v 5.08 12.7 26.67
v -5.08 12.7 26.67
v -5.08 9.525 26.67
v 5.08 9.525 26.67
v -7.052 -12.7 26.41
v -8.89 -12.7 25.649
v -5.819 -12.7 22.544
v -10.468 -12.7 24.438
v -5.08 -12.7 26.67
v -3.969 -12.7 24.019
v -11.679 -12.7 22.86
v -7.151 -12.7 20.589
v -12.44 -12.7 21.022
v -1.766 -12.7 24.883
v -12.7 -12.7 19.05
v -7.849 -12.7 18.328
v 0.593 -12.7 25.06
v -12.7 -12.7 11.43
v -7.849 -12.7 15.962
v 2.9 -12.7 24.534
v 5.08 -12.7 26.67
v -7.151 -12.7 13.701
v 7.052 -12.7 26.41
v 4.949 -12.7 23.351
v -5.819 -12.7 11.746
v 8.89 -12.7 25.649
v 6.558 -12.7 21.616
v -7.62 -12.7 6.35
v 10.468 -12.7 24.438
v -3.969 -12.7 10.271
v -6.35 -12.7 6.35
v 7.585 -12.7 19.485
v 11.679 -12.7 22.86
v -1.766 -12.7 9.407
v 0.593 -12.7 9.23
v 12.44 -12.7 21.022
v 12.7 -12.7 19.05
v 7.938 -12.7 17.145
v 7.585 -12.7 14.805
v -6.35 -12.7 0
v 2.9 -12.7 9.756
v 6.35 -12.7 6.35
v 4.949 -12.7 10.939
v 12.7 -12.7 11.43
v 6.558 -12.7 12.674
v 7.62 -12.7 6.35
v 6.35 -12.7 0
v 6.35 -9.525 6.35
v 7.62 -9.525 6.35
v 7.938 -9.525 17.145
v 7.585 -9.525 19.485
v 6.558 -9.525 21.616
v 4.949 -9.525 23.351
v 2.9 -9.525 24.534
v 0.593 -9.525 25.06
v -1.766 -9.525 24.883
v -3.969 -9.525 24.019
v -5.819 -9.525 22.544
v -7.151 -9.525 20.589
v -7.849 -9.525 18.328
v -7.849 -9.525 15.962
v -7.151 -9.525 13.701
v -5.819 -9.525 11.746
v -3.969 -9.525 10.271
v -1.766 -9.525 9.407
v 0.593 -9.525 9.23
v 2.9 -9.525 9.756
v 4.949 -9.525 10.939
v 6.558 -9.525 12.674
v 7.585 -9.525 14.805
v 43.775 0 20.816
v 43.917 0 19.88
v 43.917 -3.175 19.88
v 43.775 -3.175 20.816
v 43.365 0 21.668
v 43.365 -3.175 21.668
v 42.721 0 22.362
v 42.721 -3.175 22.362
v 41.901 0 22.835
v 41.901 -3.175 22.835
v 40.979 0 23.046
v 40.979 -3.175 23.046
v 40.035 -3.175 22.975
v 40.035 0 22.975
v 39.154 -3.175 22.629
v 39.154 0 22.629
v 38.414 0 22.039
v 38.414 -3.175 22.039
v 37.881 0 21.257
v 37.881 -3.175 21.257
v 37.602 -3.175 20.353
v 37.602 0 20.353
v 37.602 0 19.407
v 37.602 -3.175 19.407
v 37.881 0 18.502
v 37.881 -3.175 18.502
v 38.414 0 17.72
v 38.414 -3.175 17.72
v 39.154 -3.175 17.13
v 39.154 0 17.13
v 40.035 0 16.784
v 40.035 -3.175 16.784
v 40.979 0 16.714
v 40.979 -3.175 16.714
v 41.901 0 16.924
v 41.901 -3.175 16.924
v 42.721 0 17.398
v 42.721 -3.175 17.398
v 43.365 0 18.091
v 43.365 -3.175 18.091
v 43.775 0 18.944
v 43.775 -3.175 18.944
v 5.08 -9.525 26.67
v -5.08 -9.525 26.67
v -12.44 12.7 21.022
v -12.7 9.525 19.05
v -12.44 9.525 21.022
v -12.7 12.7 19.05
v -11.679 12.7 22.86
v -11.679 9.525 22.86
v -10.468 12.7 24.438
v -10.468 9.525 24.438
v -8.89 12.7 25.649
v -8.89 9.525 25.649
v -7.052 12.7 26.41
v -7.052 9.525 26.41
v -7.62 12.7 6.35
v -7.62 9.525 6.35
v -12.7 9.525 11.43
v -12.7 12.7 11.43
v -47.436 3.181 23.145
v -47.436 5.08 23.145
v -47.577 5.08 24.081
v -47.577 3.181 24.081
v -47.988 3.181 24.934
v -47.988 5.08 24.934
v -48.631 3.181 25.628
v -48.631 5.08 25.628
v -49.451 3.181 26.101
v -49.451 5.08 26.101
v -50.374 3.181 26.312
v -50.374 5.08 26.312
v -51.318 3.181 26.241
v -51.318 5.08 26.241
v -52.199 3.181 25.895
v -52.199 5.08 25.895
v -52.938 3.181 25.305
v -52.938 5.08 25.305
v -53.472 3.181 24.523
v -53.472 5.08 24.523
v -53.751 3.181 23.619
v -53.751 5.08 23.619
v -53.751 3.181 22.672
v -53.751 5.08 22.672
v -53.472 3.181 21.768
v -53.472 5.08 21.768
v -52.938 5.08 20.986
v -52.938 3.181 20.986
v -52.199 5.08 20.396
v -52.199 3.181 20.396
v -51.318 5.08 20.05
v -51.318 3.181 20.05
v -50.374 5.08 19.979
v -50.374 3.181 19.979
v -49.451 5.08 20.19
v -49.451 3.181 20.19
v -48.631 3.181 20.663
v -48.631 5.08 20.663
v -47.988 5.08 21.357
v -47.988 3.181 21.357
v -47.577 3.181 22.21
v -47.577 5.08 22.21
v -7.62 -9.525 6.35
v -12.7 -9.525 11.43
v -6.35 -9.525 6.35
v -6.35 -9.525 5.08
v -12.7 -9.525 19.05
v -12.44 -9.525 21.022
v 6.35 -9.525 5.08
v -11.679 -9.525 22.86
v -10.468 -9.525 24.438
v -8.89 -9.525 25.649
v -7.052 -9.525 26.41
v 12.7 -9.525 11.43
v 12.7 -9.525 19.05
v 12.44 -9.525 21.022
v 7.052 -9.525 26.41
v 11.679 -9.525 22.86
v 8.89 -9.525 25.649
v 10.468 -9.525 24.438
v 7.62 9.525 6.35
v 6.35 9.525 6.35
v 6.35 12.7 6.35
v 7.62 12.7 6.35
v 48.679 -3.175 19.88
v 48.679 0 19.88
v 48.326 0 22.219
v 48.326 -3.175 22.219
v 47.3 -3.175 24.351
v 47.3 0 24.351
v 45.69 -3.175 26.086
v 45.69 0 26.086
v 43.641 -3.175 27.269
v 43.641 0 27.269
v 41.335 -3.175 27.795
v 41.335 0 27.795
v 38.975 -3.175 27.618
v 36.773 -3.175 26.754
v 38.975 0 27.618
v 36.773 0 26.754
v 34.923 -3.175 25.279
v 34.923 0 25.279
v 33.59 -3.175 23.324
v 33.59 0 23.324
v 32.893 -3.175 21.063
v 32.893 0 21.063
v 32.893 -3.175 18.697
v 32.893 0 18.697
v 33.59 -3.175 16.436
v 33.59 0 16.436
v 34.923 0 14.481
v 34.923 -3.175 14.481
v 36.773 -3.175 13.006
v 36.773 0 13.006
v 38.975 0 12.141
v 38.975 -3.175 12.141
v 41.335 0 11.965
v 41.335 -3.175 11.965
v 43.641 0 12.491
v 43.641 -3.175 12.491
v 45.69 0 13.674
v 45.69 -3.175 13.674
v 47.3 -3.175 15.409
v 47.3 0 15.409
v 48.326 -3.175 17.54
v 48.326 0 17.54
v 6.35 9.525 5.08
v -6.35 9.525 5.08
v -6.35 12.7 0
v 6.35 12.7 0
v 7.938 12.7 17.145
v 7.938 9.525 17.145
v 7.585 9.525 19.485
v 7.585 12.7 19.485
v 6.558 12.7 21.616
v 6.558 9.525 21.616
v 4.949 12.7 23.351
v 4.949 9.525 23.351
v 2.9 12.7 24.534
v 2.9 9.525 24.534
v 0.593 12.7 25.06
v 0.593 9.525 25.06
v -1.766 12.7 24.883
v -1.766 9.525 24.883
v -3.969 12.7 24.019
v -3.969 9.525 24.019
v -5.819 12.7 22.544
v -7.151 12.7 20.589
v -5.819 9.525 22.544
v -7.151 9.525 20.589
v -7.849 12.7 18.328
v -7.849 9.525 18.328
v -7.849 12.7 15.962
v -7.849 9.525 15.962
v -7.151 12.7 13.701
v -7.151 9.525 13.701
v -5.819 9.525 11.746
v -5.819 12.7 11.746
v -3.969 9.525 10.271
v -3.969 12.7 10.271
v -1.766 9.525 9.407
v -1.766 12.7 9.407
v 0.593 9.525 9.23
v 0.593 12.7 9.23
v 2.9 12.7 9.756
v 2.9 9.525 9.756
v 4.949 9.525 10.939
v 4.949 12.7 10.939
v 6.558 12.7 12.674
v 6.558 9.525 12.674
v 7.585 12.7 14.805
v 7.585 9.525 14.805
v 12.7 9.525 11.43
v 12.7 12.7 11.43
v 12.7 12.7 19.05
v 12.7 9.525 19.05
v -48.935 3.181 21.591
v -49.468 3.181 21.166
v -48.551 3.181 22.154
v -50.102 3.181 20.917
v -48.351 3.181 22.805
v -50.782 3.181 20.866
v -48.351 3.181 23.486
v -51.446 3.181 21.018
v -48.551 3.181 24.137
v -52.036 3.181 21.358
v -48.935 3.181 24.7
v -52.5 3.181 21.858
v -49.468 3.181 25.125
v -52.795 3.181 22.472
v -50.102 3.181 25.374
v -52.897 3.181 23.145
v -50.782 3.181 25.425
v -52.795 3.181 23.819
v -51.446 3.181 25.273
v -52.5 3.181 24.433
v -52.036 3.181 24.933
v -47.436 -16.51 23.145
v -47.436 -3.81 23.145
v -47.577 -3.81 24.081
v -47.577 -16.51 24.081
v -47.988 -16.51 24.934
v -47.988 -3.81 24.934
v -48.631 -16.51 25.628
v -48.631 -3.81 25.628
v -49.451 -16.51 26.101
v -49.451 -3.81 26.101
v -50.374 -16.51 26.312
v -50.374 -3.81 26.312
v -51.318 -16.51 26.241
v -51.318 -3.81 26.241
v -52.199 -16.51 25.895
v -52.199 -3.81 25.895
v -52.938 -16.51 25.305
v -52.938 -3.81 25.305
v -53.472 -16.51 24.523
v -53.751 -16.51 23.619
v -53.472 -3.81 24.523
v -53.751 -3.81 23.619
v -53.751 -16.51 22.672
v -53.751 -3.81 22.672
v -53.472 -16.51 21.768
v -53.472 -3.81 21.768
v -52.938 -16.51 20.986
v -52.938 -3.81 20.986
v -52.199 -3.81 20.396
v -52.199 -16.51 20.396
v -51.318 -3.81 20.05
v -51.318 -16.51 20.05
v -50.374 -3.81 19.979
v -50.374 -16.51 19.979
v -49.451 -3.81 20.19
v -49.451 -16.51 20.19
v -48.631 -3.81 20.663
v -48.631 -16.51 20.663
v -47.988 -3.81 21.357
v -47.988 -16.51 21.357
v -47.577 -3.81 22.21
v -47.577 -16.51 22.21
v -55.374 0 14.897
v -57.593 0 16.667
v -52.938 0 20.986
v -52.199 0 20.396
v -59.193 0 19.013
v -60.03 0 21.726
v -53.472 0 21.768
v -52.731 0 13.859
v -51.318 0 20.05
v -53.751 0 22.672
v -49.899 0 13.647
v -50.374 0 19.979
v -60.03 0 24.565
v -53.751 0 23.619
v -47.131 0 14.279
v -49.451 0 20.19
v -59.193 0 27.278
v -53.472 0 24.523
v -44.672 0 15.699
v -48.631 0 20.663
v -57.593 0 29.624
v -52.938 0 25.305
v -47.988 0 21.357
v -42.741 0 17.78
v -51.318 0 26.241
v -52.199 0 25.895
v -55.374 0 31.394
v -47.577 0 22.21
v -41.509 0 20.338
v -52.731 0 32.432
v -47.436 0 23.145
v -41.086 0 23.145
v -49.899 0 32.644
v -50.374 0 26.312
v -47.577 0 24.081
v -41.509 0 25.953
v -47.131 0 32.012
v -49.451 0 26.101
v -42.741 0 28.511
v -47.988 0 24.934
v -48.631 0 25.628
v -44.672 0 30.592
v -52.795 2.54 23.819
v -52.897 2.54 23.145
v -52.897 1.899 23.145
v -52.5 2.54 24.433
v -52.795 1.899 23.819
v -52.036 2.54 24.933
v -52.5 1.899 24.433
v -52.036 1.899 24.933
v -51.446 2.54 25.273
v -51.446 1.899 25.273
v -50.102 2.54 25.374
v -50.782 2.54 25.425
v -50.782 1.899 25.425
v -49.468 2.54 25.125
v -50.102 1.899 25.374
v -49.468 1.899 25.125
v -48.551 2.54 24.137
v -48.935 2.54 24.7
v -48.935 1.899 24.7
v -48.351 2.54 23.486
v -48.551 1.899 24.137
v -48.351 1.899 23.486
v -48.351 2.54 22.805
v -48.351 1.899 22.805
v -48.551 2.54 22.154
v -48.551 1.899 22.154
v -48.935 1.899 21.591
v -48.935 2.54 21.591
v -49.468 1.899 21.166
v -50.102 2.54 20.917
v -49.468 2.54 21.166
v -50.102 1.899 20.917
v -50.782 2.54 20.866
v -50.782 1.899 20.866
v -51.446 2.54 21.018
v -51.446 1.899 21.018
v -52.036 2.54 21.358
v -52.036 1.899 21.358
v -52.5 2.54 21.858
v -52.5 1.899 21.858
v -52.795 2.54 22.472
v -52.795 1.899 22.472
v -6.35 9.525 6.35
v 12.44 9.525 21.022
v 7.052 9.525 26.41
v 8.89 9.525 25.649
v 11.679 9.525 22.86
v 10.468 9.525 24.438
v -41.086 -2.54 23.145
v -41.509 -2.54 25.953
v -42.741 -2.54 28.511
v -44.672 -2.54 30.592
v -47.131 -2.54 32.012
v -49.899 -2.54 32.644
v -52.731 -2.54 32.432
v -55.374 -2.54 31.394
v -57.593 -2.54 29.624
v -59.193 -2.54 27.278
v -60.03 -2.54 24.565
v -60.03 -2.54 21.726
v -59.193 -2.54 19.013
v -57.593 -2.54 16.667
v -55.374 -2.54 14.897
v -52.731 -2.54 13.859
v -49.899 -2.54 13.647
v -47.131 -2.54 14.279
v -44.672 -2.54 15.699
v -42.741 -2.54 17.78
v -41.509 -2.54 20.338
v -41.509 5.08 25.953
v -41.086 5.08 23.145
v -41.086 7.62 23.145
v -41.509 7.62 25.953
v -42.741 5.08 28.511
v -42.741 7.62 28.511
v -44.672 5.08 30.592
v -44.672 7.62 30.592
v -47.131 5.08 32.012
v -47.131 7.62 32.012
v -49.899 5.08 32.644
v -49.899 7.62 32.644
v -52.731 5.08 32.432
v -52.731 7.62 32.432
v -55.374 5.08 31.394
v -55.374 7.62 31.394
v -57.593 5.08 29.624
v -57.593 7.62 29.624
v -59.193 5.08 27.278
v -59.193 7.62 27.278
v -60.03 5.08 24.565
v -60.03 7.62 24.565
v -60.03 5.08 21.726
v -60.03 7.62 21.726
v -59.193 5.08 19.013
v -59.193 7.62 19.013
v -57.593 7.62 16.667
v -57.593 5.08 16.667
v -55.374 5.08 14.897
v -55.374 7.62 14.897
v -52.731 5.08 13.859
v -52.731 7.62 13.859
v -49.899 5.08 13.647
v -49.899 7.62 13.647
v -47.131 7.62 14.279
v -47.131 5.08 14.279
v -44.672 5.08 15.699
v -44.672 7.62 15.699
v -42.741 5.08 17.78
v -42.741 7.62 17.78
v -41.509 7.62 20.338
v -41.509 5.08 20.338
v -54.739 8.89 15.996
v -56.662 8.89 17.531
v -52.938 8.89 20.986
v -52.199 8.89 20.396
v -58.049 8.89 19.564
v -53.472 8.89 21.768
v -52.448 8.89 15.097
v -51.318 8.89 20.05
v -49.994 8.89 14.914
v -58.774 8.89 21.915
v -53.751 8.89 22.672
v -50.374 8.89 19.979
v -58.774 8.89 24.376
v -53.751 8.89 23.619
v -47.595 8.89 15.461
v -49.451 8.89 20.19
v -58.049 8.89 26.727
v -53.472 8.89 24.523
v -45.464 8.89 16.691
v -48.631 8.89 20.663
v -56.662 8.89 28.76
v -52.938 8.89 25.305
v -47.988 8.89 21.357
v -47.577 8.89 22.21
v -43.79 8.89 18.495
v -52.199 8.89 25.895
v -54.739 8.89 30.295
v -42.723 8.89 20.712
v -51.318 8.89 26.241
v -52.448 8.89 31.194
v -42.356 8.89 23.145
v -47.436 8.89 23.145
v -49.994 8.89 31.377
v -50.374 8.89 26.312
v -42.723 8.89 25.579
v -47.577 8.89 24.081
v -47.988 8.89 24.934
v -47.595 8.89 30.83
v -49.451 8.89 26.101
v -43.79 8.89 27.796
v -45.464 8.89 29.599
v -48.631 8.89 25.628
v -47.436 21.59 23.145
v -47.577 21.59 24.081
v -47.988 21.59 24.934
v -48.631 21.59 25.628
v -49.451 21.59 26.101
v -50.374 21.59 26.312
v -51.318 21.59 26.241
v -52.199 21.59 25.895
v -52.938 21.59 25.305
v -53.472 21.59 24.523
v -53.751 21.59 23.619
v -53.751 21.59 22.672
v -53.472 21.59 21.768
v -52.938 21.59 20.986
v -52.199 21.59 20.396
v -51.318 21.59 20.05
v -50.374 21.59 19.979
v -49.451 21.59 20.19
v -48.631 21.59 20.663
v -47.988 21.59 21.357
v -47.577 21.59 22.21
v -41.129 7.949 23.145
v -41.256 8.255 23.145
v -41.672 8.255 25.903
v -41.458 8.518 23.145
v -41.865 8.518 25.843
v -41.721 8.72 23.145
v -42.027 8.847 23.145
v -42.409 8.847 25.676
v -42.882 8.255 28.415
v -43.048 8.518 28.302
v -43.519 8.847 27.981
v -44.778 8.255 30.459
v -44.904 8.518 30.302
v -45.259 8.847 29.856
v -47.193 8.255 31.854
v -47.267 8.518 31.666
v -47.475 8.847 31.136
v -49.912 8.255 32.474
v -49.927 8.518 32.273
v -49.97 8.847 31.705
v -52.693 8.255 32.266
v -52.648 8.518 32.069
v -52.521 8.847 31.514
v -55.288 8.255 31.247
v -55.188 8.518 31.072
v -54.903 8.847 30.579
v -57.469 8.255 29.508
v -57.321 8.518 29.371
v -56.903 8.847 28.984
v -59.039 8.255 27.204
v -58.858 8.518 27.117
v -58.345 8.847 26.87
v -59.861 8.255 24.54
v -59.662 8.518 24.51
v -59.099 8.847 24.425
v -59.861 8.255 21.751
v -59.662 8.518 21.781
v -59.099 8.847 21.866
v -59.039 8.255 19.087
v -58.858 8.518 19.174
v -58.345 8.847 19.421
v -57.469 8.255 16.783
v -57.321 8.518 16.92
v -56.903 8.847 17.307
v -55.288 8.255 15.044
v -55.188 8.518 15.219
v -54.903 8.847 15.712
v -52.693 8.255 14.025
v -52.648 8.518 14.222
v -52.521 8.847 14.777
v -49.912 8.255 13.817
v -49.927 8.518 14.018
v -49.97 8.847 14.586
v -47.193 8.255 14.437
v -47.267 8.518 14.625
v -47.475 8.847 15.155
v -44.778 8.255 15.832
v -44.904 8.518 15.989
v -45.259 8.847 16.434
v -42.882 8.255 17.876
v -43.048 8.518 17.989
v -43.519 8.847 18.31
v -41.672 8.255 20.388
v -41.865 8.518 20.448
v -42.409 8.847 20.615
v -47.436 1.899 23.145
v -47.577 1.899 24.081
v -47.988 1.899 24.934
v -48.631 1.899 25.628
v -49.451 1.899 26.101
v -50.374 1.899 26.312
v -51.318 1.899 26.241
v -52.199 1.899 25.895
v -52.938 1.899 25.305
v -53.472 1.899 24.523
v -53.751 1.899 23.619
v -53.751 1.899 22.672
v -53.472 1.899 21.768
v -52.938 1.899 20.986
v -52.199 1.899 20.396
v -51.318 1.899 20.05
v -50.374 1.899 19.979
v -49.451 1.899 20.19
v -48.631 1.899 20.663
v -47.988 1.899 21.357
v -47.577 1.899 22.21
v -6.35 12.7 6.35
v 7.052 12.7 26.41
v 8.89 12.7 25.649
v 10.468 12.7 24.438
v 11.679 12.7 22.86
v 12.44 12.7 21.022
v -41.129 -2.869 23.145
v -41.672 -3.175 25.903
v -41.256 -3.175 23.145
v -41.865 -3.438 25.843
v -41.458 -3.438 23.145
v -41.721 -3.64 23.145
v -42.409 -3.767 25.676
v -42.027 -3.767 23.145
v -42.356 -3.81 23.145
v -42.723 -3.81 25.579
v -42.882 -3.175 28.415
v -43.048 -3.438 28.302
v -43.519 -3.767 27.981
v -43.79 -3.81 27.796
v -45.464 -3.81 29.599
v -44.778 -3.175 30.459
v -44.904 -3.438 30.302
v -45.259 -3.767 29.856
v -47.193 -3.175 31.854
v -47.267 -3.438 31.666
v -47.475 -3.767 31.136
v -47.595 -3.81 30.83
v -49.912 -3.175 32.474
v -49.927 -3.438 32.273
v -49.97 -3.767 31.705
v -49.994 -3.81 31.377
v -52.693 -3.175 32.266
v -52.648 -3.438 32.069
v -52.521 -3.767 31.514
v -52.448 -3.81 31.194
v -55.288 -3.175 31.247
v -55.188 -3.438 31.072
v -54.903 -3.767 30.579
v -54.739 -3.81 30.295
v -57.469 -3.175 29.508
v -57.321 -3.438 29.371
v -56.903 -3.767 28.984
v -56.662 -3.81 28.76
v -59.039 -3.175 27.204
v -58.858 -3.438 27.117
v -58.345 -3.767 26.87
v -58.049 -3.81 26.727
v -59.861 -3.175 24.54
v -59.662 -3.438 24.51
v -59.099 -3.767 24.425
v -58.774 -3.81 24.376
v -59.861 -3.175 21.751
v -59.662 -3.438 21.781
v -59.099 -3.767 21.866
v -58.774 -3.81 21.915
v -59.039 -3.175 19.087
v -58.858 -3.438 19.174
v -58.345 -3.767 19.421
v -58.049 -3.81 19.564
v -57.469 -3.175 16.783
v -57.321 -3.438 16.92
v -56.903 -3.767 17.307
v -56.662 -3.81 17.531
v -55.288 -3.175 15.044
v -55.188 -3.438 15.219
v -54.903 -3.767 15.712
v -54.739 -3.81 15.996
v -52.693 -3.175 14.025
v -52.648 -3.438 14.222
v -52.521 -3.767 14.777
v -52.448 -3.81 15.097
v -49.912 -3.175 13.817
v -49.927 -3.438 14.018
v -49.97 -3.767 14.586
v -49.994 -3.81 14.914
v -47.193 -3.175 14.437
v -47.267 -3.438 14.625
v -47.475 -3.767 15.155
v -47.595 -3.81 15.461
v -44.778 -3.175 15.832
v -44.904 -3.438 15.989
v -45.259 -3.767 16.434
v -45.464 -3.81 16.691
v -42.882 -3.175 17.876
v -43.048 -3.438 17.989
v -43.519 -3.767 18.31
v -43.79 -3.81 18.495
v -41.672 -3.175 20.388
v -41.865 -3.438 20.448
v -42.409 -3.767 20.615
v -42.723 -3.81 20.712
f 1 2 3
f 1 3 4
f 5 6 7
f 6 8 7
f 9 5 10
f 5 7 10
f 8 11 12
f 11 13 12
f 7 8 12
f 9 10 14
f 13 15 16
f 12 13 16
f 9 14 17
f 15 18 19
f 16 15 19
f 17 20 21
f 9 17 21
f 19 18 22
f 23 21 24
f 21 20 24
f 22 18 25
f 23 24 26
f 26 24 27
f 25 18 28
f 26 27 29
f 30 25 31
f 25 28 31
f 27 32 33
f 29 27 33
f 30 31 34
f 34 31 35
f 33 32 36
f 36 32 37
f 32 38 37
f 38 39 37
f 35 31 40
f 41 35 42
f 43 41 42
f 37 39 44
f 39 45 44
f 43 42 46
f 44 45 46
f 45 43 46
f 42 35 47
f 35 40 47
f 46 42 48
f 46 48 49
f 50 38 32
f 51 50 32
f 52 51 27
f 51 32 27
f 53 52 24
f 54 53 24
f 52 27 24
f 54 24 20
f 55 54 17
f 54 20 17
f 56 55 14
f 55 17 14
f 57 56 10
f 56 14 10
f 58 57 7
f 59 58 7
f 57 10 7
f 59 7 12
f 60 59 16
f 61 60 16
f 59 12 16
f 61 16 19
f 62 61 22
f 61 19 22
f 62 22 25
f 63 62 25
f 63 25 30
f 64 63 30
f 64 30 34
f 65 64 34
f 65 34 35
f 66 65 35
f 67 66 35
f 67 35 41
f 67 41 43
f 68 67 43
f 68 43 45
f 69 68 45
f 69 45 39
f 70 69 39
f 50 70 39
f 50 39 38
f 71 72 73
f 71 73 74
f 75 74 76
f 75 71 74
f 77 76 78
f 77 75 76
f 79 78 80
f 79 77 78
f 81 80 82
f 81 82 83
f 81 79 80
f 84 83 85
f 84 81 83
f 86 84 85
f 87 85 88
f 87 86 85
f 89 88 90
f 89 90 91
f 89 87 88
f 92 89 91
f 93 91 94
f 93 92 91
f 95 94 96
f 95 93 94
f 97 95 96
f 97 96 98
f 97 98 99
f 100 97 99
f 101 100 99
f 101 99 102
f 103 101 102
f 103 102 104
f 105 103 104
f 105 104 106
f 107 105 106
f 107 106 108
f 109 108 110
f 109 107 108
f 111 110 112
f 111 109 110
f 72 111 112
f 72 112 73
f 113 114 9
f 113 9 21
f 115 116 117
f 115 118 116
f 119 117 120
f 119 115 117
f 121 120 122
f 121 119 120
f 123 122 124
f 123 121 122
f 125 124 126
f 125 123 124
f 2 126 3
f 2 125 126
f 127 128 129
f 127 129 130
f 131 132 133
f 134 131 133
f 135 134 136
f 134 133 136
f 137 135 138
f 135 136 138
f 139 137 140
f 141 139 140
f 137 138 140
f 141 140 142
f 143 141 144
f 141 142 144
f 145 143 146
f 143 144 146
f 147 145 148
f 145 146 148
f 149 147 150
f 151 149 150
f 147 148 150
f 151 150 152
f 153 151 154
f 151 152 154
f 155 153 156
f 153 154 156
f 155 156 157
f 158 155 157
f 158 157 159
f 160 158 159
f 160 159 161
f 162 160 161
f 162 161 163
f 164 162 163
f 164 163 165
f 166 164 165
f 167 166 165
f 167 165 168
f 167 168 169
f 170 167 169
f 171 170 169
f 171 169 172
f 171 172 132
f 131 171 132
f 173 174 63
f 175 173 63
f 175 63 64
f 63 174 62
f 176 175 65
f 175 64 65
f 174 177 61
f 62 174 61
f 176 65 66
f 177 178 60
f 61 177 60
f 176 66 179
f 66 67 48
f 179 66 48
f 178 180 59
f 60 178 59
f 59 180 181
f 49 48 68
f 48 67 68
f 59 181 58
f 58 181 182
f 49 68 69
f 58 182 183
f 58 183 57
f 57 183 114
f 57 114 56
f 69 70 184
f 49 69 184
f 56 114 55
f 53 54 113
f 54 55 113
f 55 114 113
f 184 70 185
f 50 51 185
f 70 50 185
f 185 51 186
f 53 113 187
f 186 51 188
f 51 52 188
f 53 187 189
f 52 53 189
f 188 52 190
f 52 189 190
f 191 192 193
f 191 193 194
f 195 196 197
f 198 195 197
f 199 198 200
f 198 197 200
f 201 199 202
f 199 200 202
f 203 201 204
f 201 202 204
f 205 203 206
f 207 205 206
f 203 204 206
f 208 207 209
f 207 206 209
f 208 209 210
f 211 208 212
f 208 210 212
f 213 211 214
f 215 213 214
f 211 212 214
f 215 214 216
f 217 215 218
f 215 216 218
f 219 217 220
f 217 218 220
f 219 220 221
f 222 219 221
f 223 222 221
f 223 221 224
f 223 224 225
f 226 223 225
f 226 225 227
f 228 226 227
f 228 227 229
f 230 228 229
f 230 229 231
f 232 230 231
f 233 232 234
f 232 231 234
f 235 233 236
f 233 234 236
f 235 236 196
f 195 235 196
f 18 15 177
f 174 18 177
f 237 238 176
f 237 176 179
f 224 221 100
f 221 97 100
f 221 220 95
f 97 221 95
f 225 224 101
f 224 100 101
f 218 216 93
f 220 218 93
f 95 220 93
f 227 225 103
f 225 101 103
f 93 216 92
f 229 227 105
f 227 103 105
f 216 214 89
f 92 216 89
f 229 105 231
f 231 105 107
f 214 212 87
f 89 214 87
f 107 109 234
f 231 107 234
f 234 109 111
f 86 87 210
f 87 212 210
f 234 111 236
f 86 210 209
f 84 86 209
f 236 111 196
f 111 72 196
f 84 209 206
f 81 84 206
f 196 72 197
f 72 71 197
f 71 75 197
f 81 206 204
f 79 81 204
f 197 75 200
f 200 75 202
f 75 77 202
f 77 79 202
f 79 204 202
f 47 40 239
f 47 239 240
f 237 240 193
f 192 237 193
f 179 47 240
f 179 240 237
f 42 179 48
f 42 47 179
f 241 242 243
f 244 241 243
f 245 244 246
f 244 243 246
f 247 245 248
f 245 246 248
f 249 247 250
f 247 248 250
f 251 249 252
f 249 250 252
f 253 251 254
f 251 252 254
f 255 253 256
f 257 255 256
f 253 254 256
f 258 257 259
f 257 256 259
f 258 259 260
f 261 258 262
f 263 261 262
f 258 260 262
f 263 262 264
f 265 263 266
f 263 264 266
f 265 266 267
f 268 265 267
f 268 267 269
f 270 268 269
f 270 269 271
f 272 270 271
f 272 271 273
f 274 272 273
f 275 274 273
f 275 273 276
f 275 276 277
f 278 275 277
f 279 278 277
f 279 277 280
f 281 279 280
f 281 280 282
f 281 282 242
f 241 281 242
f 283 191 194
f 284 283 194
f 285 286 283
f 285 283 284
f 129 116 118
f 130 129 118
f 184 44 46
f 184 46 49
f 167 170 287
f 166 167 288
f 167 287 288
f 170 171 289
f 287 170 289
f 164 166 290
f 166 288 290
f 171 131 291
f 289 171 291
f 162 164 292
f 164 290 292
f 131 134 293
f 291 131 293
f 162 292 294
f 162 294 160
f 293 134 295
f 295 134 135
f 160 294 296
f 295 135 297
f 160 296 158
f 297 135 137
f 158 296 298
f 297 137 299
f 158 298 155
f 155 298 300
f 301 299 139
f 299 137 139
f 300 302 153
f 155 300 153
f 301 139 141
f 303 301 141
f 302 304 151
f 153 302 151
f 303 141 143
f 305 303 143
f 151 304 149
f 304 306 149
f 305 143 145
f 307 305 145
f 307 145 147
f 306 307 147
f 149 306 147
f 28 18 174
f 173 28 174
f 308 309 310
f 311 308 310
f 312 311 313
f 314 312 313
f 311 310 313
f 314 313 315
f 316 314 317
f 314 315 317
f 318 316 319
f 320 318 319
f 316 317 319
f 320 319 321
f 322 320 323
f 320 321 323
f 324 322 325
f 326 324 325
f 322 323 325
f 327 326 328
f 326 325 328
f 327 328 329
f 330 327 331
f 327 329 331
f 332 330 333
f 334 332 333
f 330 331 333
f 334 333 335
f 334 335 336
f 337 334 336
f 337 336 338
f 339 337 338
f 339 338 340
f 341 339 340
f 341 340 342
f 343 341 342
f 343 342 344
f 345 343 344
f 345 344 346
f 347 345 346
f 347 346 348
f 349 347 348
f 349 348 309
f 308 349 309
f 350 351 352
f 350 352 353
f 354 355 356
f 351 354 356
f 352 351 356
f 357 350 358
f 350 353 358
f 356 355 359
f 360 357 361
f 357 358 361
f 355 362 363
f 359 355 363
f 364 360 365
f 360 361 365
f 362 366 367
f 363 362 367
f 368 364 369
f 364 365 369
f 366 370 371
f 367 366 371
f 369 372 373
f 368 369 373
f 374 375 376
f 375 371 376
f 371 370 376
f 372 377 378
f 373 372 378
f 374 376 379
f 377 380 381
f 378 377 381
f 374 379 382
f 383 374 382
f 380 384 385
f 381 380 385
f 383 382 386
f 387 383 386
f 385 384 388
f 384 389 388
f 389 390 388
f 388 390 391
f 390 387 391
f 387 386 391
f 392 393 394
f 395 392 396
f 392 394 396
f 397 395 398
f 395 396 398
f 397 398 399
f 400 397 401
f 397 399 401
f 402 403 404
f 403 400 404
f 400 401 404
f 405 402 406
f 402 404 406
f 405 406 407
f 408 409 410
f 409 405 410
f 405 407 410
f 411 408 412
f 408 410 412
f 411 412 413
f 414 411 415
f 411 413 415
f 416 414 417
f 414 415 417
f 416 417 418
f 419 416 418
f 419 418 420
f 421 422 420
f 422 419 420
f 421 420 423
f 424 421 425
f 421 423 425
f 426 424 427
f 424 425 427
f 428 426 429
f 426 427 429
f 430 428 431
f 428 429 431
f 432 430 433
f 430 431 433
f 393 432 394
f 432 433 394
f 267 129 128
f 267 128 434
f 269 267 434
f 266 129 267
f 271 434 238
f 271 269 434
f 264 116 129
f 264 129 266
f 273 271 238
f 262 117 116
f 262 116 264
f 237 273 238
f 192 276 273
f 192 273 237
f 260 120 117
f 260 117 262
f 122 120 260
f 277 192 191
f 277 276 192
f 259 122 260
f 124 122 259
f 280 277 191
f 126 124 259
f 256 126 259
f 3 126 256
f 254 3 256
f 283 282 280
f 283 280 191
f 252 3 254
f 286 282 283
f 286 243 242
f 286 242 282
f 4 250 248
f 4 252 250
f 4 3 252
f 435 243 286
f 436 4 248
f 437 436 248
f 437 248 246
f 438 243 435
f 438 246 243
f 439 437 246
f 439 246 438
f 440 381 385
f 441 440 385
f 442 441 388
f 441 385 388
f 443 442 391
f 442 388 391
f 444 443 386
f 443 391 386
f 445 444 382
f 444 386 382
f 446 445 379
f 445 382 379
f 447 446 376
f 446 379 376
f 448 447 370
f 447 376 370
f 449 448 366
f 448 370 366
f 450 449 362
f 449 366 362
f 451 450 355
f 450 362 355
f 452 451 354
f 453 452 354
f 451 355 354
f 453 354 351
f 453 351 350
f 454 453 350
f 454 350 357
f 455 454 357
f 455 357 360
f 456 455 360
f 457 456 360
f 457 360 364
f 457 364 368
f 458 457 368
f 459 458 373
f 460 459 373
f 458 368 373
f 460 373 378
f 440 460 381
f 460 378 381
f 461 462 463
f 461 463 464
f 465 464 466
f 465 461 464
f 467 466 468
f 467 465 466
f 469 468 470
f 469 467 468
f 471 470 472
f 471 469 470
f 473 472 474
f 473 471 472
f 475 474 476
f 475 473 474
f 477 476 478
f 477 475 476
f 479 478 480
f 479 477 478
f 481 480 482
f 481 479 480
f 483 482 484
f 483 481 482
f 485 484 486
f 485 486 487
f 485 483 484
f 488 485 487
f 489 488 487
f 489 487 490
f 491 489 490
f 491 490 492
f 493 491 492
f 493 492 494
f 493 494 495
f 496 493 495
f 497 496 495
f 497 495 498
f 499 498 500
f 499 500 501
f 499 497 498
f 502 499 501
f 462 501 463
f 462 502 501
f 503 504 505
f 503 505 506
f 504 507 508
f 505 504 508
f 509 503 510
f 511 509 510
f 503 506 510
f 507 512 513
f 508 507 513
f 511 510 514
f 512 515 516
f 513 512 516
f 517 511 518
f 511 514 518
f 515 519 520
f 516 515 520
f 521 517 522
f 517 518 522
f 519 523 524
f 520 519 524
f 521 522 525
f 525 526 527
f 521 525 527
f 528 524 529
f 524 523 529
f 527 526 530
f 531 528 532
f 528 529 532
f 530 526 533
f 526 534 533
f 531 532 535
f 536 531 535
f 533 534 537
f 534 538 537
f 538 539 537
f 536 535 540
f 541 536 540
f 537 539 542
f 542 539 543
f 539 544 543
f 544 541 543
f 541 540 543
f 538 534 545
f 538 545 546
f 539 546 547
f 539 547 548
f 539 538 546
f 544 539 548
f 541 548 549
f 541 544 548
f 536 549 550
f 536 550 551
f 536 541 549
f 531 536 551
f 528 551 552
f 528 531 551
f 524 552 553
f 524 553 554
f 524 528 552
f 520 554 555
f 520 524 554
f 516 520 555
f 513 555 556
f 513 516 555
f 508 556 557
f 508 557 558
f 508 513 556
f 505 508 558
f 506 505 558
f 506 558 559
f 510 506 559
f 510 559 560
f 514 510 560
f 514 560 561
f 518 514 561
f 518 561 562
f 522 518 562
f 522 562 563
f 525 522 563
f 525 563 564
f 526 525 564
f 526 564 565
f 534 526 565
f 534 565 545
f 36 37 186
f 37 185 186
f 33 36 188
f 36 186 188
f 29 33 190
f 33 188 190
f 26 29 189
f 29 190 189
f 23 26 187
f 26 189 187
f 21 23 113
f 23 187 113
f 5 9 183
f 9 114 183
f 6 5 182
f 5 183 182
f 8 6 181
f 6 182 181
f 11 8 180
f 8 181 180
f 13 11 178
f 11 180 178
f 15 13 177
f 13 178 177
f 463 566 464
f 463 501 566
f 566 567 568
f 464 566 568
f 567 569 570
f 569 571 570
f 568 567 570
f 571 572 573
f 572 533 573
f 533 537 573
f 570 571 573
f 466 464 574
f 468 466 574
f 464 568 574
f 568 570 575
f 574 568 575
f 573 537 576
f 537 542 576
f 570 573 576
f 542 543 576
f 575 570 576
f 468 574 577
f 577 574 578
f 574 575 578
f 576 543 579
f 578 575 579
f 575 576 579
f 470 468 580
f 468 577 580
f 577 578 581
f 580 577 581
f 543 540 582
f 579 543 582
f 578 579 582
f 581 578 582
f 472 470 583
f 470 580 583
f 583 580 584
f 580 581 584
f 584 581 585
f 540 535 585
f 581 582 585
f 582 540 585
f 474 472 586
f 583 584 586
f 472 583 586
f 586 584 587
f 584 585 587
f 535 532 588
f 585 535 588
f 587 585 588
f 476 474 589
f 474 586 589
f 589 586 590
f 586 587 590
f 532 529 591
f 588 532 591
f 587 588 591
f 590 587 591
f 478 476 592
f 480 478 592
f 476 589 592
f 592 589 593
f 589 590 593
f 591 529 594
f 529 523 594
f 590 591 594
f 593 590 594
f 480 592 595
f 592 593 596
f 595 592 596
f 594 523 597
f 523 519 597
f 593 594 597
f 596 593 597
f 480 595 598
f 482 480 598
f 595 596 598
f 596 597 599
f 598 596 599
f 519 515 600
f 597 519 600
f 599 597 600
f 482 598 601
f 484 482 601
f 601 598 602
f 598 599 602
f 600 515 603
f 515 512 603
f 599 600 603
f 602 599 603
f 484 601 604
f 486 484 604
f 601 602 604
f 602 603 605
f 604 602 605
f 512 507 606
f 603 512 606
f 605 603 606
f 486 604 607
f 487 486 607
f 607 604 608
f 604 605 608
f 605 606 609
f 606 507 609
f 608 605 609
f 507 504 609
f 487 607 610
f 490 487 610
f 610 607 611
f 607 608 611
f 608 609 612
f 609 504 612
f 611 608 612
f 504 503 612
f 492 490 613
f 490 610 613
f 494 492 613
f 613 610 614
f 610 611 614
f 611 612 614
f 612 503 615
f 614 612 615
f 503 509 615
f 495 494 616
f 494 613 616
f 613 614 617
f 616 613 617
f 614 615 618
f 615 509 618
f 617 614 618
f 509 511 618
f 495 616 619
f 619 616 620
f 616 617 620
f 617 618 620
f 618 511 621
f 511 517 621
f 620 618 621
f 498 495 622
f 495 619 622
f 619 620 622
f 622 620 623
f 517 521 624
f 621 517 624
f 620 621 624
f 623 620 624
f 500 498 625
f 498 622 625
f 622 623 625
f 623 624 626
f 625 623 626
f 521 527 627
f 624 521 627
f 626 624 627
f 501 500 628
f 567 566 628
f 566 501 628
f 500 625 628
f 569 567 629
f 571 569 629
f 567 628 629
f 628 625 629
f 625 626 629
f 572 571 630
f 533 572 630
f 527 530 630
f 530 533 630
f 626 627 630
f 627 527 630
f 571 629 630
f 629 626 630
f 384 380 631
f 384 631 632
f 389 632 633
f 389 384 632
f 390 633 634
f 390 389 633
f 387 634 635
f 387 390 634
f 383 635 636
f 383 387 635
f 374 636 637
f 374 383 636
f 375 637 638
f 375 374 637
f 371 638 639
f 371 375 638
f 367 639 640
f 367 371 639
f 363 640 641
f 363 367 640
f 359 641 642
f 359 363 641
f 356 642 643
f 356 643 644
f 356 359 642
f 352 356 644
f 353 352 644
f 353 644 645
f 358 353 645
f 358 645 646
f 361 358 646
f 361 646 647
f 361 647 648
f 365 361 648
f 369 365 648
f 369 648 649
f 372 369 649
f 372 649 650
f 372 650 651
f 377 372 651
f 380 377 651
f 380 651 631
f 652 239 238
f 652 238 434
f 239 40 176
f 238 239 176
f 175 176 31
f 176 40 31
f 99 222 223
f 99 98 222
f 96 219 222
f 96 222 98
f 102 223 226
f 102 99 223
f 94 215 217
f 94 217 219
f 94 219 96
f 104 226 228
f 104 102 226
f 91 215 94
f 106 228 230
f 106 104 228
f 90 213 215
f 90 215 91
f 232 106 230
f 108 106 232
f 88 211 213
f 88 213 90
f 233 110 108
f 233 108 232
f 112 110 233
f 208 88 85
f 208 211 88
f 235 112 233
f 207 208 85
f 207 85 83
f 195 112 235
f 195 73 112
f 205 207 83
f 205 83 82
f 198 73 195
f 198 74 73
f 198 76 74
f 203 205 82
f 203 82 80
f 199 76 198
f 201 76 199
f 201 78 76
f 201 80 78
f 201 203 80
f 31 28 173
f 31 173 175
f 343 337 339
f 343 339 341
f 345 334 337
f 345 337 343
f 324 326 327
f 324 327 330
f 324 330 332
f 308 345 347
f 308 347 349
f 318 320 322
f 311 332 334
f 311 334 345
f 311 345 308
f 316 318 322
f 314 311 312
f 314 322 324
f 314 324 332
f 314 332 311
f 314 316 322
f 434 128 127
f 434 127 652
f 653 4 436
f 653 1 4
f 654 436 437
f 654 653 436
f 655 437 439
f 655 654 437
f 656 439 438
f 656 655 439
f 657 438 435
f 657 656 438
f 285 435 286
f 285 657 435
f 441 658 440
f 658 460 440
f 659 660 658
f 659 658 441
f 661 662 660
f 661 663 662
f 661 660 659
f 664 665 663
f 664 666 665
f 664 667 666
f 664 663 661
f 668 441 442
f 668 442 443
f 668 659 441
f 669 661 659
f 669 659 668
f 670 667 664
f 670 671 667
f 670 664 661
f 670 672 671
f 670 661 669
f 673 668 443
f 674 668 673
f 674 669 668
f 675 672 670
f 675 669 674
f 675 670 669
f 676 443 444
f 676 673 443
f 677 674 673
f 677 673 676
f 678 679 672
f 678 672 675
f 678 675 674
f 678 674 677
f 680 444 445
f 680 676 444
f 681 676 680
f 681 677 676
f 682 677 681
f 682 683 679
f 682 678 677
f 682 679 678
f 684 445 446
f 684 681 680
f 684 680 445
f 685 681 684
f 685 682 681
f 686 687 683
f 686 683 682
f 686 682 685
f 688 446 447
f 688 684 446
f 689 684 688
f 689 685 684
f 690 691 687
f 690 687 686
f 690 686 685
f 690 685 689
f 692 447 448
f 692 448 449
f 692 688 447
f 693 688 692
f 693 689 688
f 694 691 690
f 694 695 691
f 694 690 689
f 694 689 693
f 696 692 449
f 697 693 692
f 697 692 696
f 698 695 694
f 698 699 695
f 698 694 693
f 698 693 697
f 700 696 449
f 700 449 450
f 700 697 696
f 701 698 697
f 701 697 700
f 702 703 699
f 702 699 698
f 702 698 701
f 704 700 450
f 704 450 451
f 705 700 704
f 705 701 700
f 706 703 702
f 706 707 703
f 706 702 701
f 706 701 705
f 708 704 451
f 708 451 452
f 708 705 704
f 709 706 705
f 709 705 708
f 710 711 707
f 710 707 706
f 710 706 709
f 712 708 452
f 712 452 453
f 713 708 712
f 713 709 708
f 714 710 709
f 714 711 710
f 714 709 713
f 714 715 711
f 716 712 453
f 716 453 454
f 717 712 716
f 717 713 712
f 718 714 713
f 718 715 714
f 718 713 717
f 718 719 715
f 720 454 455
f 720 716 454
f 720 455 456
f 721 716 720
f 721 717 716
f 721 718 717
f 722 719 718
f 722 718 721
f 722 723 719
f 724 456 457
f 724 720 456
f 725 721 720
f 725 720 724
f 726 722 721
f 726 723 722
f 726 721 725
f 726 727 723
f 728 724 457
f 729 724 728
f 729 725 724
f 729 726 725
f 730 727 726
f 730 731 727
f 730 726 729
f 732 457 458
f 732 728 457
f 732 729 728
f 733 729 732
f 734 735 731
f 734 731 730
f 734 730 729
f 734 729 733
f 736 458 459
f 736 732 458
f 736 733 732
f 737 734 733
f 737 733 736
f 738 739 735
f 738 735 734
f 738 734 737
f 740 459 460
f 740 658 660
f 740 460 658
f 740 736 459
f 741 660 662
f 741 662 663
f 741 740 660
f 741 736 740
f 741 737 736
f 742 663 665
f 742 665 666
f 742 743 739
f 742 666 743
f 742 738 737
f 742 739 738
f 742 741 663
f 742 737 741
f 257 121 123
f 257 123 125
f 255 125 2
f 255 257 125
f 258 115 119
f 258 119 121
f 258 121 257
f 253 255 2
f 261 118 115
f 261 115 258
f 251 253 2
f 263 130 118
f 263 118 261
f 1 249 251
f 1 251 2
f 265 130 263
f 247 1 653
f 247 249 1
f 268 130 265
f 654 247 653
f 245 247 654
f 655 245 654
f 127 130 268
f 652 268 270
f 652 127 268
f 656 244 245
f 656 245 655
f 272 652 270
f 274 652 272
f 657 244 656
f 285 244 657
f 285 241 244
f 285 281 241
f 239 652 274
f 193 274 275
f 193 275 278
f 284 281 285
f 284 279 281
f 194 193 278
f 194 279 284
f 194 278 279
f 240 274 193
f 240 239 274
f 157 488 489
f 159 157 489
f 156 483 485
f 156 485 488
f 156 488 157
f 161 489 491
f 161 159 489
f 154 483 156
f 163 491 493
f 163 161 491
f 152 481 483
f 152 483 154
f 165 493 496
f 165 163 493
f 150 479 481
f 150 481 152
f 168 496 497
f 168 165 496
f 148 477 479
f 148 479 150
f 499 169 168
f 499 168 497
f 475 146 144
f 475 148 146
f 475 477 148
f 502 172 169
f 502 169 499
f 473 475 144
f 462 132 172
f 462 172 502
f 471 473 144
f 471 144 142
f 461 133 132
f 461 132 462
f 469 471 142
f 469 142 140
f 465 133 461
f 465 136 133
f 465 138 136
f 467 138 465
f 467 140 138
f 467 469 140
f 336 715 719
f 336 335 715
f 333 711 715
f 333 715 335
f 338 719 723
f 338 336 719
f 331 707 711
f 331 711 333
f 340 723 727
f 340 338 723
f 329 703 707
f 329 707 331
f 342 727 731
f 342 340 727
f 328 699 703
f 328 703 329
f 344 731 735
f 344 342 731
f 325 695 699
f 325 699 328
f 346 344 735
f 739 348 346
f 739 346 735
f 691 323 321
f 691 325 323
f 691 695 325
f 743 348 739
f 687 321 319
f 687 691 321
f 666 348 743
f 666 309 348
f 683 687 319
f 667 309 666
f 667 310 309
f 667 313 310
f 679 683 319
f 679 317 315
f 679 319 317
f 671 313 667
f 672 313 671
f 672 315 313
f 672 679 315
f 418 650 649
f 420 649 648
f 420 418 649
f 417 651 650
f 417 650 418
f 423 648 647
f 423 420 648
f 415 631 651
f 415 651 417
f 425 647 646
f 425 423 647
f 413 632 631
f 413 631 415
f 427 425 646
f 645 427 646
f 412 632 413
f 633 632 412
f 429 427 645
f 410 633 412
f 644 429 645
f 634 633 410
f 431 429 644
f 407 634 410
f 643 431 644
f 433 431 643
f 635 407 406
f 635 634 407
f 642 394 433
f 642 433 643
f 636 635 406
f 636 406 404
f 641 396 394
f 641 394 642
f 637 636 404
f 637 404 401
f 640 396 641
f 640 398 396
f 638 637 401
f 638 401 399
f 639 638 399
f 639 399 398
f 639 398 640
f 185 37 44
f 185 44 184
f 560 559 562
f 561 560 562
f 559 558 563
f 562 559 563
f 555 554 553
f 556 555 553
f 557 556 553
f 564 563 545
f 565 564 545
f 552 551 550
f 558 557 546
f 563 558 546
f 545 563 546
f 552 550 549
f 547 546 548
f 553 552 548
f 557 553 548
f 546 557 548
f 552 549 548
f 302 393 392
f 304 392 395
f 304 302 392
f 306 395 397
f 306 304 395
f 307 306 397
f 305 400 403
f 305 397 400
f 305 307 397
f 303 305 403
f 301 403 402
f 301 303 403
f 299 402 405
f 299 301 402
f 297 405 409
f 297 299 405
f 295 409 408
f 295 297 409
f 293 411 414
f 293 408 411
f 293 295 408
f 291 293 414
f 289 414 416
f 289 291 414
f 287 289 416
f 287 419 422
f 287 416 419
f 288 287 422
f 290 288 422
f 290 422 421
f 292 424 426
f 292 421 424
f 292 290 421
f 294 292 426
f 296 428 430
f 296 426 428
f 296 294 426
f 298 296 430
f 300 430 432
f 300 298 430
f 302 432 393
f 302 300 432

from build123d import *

# Parameters (mm, degrees)
F0_W      = 25.4
F0_H      = 25.4
F1_DEPTH  = 26.67
F2_W      = 25.4
F2_H      = 19.05
F3_DEPTH  = 21.59
F4_R      = 7.9375
F4_W      = 6.35
F4_H      = 6.35
F5_DEPTH  = 25.4
F6_R      = 7.62
F7_R      = 9.525
F7_R_2    = 3.175
F8_DEPTH  = 3.81
F9_R      = 1.27
F10_DEPTH = 16.51
F11_DEPTH = 2.54
F12_R     = 3.175
F12_R_2   = 2.286
F13_DEPTH = 0.64135
F15_SIZE  = 5.08
F16_R     = 7.9375
F16_R_2   = 3.175
F17_DEPTH = 3.175


with BuildPart() as f1:
    # F0 (on Top) → F1 (new body)
    with BuildSketch(Plane.XY):
        Rectangle(F0_W, F0_H)
    extrude(amount=F1_DEPTH)

    # F2 (on face) → F3 (cut)
    with BuildSketch(Plane.XY.offset(26.67)):
        Rectangle(F2_W, F2_H)
    extrude(amount=-F3_DEPTH, mode=Mode.SUBTRACT)

    # F4 (on face) → F5 (cut)
    with BuildSketch(Plane.XZ.offset(12.7)):
        with Locations((0, 17.145)):
            Circle(F4_R)
        with Locations((-9.525, 3.175)):
            Rectangle(F4_W, F4_H)
        with Locations((9.525, 3.175)):
            Rectangle(F4_W, F4_H)
    extrude(amount=-F5_DEPTH, mode=Mode.SUBTRACT)

    # F6
    f6_edges = [f1.edges().sort_by_distance(p)[0] for p in [
        (12.7, -11.1125, 26.67),
        (-12.7, -11.1125, 26.67),
        (12.7, 11.1125, 26.67),
        (-12.7, 11.1125, 26.67),
    ]]
    fillet(f6_edges, radius=F6_R)

    # F15
    f15_edges = [f1.edges().sort_by_distance(p)[0] for p in [
        (12.7, -11.1125, 6.35),
        (-12.7, -11.1125, 6.35),
        (-12.7, 11.1125, 6.35),
        (12.7, 11.1125, 6.35),
    ]]
    chamfer(f15_edges, length=F15_SIZE)


with BuildPart() as f8:
    # F7 (on Front) → F8 (new body)
    with BuildSketch(Plane.XZ):
        with Locations((-50.6110191345, 23.1454782188)):
            Circle(F7_R)
        with Locations((-50.6110191345, 23.1454782188)):
            Circle(F7_R_2, mode=Mode.SUBTRACT)
    extrude(amount=F8_DEPTH)

    # F9
    f9_edges = [f8.edges().sort_by_distance(p)[0] for p in [
        (-60.136019, -3.81, 23.145478),
    ]]
    fillet(f9_edges, radius=F9_R)

    # F7 (on Front) → F10 (join)
    with BuildSketch(Plane.XZ):
        with Locations((-50.6110191345, 23.1454782188)):
            Circle(F7_R_2)
    extrude(amount=F10_DEPTH)

    # F7 (on Front) → F11 (join)
    with BuildSketch(Plane.XZ):
        with Locations((-50.6110191345, 23.1454782188)):
            Circle(F7_R_2)
    extrude(amount=-F11_DEPTH)

    # F12 (on face) → F13 (cut, symmetric)
    with BuildSketch(Plane(origin=(0, 2.54, 0), x_dir=(-1, 0, 0), z_dir=(0, 1, 0))):
        with Locations((50.6110191345, 23.1454782188)):
            Circle(F12_R)
        with Locations((50.6110191345, 23.1454782188)):
            Circle(F12_R_2, mode=Mode.SUBTRACT)
    extrude(amount=F13_DEPTH, both=True, mode=Mode.SUBTRACT)

    # F14: F8 across face


with BuildPart() as f8_1:
    add(f8.part)
    add(f8.part.mirror(Plane(origin=(-50.6110191345, 2.54, 23.1454782188), x_dir=(1, 0, 0), z_dir=(0, 1, 0))))


with BuildPart() as f17:
    # F16 (on Front) → F17 (new body)
    with BuildSketch(Plane.XZ):
        with Locations((40.7415293157, 19.8798608035)):
            Circle(F16_R)
        with Locations((40.7415293157, 19.8798608035)):
            Circle(F16_R_2, mode=Mode.SUBTRACT)
    extrude(amount=F17_DEPTH)


solid = Compound([f1.part, f8_1.part, f17.part])
